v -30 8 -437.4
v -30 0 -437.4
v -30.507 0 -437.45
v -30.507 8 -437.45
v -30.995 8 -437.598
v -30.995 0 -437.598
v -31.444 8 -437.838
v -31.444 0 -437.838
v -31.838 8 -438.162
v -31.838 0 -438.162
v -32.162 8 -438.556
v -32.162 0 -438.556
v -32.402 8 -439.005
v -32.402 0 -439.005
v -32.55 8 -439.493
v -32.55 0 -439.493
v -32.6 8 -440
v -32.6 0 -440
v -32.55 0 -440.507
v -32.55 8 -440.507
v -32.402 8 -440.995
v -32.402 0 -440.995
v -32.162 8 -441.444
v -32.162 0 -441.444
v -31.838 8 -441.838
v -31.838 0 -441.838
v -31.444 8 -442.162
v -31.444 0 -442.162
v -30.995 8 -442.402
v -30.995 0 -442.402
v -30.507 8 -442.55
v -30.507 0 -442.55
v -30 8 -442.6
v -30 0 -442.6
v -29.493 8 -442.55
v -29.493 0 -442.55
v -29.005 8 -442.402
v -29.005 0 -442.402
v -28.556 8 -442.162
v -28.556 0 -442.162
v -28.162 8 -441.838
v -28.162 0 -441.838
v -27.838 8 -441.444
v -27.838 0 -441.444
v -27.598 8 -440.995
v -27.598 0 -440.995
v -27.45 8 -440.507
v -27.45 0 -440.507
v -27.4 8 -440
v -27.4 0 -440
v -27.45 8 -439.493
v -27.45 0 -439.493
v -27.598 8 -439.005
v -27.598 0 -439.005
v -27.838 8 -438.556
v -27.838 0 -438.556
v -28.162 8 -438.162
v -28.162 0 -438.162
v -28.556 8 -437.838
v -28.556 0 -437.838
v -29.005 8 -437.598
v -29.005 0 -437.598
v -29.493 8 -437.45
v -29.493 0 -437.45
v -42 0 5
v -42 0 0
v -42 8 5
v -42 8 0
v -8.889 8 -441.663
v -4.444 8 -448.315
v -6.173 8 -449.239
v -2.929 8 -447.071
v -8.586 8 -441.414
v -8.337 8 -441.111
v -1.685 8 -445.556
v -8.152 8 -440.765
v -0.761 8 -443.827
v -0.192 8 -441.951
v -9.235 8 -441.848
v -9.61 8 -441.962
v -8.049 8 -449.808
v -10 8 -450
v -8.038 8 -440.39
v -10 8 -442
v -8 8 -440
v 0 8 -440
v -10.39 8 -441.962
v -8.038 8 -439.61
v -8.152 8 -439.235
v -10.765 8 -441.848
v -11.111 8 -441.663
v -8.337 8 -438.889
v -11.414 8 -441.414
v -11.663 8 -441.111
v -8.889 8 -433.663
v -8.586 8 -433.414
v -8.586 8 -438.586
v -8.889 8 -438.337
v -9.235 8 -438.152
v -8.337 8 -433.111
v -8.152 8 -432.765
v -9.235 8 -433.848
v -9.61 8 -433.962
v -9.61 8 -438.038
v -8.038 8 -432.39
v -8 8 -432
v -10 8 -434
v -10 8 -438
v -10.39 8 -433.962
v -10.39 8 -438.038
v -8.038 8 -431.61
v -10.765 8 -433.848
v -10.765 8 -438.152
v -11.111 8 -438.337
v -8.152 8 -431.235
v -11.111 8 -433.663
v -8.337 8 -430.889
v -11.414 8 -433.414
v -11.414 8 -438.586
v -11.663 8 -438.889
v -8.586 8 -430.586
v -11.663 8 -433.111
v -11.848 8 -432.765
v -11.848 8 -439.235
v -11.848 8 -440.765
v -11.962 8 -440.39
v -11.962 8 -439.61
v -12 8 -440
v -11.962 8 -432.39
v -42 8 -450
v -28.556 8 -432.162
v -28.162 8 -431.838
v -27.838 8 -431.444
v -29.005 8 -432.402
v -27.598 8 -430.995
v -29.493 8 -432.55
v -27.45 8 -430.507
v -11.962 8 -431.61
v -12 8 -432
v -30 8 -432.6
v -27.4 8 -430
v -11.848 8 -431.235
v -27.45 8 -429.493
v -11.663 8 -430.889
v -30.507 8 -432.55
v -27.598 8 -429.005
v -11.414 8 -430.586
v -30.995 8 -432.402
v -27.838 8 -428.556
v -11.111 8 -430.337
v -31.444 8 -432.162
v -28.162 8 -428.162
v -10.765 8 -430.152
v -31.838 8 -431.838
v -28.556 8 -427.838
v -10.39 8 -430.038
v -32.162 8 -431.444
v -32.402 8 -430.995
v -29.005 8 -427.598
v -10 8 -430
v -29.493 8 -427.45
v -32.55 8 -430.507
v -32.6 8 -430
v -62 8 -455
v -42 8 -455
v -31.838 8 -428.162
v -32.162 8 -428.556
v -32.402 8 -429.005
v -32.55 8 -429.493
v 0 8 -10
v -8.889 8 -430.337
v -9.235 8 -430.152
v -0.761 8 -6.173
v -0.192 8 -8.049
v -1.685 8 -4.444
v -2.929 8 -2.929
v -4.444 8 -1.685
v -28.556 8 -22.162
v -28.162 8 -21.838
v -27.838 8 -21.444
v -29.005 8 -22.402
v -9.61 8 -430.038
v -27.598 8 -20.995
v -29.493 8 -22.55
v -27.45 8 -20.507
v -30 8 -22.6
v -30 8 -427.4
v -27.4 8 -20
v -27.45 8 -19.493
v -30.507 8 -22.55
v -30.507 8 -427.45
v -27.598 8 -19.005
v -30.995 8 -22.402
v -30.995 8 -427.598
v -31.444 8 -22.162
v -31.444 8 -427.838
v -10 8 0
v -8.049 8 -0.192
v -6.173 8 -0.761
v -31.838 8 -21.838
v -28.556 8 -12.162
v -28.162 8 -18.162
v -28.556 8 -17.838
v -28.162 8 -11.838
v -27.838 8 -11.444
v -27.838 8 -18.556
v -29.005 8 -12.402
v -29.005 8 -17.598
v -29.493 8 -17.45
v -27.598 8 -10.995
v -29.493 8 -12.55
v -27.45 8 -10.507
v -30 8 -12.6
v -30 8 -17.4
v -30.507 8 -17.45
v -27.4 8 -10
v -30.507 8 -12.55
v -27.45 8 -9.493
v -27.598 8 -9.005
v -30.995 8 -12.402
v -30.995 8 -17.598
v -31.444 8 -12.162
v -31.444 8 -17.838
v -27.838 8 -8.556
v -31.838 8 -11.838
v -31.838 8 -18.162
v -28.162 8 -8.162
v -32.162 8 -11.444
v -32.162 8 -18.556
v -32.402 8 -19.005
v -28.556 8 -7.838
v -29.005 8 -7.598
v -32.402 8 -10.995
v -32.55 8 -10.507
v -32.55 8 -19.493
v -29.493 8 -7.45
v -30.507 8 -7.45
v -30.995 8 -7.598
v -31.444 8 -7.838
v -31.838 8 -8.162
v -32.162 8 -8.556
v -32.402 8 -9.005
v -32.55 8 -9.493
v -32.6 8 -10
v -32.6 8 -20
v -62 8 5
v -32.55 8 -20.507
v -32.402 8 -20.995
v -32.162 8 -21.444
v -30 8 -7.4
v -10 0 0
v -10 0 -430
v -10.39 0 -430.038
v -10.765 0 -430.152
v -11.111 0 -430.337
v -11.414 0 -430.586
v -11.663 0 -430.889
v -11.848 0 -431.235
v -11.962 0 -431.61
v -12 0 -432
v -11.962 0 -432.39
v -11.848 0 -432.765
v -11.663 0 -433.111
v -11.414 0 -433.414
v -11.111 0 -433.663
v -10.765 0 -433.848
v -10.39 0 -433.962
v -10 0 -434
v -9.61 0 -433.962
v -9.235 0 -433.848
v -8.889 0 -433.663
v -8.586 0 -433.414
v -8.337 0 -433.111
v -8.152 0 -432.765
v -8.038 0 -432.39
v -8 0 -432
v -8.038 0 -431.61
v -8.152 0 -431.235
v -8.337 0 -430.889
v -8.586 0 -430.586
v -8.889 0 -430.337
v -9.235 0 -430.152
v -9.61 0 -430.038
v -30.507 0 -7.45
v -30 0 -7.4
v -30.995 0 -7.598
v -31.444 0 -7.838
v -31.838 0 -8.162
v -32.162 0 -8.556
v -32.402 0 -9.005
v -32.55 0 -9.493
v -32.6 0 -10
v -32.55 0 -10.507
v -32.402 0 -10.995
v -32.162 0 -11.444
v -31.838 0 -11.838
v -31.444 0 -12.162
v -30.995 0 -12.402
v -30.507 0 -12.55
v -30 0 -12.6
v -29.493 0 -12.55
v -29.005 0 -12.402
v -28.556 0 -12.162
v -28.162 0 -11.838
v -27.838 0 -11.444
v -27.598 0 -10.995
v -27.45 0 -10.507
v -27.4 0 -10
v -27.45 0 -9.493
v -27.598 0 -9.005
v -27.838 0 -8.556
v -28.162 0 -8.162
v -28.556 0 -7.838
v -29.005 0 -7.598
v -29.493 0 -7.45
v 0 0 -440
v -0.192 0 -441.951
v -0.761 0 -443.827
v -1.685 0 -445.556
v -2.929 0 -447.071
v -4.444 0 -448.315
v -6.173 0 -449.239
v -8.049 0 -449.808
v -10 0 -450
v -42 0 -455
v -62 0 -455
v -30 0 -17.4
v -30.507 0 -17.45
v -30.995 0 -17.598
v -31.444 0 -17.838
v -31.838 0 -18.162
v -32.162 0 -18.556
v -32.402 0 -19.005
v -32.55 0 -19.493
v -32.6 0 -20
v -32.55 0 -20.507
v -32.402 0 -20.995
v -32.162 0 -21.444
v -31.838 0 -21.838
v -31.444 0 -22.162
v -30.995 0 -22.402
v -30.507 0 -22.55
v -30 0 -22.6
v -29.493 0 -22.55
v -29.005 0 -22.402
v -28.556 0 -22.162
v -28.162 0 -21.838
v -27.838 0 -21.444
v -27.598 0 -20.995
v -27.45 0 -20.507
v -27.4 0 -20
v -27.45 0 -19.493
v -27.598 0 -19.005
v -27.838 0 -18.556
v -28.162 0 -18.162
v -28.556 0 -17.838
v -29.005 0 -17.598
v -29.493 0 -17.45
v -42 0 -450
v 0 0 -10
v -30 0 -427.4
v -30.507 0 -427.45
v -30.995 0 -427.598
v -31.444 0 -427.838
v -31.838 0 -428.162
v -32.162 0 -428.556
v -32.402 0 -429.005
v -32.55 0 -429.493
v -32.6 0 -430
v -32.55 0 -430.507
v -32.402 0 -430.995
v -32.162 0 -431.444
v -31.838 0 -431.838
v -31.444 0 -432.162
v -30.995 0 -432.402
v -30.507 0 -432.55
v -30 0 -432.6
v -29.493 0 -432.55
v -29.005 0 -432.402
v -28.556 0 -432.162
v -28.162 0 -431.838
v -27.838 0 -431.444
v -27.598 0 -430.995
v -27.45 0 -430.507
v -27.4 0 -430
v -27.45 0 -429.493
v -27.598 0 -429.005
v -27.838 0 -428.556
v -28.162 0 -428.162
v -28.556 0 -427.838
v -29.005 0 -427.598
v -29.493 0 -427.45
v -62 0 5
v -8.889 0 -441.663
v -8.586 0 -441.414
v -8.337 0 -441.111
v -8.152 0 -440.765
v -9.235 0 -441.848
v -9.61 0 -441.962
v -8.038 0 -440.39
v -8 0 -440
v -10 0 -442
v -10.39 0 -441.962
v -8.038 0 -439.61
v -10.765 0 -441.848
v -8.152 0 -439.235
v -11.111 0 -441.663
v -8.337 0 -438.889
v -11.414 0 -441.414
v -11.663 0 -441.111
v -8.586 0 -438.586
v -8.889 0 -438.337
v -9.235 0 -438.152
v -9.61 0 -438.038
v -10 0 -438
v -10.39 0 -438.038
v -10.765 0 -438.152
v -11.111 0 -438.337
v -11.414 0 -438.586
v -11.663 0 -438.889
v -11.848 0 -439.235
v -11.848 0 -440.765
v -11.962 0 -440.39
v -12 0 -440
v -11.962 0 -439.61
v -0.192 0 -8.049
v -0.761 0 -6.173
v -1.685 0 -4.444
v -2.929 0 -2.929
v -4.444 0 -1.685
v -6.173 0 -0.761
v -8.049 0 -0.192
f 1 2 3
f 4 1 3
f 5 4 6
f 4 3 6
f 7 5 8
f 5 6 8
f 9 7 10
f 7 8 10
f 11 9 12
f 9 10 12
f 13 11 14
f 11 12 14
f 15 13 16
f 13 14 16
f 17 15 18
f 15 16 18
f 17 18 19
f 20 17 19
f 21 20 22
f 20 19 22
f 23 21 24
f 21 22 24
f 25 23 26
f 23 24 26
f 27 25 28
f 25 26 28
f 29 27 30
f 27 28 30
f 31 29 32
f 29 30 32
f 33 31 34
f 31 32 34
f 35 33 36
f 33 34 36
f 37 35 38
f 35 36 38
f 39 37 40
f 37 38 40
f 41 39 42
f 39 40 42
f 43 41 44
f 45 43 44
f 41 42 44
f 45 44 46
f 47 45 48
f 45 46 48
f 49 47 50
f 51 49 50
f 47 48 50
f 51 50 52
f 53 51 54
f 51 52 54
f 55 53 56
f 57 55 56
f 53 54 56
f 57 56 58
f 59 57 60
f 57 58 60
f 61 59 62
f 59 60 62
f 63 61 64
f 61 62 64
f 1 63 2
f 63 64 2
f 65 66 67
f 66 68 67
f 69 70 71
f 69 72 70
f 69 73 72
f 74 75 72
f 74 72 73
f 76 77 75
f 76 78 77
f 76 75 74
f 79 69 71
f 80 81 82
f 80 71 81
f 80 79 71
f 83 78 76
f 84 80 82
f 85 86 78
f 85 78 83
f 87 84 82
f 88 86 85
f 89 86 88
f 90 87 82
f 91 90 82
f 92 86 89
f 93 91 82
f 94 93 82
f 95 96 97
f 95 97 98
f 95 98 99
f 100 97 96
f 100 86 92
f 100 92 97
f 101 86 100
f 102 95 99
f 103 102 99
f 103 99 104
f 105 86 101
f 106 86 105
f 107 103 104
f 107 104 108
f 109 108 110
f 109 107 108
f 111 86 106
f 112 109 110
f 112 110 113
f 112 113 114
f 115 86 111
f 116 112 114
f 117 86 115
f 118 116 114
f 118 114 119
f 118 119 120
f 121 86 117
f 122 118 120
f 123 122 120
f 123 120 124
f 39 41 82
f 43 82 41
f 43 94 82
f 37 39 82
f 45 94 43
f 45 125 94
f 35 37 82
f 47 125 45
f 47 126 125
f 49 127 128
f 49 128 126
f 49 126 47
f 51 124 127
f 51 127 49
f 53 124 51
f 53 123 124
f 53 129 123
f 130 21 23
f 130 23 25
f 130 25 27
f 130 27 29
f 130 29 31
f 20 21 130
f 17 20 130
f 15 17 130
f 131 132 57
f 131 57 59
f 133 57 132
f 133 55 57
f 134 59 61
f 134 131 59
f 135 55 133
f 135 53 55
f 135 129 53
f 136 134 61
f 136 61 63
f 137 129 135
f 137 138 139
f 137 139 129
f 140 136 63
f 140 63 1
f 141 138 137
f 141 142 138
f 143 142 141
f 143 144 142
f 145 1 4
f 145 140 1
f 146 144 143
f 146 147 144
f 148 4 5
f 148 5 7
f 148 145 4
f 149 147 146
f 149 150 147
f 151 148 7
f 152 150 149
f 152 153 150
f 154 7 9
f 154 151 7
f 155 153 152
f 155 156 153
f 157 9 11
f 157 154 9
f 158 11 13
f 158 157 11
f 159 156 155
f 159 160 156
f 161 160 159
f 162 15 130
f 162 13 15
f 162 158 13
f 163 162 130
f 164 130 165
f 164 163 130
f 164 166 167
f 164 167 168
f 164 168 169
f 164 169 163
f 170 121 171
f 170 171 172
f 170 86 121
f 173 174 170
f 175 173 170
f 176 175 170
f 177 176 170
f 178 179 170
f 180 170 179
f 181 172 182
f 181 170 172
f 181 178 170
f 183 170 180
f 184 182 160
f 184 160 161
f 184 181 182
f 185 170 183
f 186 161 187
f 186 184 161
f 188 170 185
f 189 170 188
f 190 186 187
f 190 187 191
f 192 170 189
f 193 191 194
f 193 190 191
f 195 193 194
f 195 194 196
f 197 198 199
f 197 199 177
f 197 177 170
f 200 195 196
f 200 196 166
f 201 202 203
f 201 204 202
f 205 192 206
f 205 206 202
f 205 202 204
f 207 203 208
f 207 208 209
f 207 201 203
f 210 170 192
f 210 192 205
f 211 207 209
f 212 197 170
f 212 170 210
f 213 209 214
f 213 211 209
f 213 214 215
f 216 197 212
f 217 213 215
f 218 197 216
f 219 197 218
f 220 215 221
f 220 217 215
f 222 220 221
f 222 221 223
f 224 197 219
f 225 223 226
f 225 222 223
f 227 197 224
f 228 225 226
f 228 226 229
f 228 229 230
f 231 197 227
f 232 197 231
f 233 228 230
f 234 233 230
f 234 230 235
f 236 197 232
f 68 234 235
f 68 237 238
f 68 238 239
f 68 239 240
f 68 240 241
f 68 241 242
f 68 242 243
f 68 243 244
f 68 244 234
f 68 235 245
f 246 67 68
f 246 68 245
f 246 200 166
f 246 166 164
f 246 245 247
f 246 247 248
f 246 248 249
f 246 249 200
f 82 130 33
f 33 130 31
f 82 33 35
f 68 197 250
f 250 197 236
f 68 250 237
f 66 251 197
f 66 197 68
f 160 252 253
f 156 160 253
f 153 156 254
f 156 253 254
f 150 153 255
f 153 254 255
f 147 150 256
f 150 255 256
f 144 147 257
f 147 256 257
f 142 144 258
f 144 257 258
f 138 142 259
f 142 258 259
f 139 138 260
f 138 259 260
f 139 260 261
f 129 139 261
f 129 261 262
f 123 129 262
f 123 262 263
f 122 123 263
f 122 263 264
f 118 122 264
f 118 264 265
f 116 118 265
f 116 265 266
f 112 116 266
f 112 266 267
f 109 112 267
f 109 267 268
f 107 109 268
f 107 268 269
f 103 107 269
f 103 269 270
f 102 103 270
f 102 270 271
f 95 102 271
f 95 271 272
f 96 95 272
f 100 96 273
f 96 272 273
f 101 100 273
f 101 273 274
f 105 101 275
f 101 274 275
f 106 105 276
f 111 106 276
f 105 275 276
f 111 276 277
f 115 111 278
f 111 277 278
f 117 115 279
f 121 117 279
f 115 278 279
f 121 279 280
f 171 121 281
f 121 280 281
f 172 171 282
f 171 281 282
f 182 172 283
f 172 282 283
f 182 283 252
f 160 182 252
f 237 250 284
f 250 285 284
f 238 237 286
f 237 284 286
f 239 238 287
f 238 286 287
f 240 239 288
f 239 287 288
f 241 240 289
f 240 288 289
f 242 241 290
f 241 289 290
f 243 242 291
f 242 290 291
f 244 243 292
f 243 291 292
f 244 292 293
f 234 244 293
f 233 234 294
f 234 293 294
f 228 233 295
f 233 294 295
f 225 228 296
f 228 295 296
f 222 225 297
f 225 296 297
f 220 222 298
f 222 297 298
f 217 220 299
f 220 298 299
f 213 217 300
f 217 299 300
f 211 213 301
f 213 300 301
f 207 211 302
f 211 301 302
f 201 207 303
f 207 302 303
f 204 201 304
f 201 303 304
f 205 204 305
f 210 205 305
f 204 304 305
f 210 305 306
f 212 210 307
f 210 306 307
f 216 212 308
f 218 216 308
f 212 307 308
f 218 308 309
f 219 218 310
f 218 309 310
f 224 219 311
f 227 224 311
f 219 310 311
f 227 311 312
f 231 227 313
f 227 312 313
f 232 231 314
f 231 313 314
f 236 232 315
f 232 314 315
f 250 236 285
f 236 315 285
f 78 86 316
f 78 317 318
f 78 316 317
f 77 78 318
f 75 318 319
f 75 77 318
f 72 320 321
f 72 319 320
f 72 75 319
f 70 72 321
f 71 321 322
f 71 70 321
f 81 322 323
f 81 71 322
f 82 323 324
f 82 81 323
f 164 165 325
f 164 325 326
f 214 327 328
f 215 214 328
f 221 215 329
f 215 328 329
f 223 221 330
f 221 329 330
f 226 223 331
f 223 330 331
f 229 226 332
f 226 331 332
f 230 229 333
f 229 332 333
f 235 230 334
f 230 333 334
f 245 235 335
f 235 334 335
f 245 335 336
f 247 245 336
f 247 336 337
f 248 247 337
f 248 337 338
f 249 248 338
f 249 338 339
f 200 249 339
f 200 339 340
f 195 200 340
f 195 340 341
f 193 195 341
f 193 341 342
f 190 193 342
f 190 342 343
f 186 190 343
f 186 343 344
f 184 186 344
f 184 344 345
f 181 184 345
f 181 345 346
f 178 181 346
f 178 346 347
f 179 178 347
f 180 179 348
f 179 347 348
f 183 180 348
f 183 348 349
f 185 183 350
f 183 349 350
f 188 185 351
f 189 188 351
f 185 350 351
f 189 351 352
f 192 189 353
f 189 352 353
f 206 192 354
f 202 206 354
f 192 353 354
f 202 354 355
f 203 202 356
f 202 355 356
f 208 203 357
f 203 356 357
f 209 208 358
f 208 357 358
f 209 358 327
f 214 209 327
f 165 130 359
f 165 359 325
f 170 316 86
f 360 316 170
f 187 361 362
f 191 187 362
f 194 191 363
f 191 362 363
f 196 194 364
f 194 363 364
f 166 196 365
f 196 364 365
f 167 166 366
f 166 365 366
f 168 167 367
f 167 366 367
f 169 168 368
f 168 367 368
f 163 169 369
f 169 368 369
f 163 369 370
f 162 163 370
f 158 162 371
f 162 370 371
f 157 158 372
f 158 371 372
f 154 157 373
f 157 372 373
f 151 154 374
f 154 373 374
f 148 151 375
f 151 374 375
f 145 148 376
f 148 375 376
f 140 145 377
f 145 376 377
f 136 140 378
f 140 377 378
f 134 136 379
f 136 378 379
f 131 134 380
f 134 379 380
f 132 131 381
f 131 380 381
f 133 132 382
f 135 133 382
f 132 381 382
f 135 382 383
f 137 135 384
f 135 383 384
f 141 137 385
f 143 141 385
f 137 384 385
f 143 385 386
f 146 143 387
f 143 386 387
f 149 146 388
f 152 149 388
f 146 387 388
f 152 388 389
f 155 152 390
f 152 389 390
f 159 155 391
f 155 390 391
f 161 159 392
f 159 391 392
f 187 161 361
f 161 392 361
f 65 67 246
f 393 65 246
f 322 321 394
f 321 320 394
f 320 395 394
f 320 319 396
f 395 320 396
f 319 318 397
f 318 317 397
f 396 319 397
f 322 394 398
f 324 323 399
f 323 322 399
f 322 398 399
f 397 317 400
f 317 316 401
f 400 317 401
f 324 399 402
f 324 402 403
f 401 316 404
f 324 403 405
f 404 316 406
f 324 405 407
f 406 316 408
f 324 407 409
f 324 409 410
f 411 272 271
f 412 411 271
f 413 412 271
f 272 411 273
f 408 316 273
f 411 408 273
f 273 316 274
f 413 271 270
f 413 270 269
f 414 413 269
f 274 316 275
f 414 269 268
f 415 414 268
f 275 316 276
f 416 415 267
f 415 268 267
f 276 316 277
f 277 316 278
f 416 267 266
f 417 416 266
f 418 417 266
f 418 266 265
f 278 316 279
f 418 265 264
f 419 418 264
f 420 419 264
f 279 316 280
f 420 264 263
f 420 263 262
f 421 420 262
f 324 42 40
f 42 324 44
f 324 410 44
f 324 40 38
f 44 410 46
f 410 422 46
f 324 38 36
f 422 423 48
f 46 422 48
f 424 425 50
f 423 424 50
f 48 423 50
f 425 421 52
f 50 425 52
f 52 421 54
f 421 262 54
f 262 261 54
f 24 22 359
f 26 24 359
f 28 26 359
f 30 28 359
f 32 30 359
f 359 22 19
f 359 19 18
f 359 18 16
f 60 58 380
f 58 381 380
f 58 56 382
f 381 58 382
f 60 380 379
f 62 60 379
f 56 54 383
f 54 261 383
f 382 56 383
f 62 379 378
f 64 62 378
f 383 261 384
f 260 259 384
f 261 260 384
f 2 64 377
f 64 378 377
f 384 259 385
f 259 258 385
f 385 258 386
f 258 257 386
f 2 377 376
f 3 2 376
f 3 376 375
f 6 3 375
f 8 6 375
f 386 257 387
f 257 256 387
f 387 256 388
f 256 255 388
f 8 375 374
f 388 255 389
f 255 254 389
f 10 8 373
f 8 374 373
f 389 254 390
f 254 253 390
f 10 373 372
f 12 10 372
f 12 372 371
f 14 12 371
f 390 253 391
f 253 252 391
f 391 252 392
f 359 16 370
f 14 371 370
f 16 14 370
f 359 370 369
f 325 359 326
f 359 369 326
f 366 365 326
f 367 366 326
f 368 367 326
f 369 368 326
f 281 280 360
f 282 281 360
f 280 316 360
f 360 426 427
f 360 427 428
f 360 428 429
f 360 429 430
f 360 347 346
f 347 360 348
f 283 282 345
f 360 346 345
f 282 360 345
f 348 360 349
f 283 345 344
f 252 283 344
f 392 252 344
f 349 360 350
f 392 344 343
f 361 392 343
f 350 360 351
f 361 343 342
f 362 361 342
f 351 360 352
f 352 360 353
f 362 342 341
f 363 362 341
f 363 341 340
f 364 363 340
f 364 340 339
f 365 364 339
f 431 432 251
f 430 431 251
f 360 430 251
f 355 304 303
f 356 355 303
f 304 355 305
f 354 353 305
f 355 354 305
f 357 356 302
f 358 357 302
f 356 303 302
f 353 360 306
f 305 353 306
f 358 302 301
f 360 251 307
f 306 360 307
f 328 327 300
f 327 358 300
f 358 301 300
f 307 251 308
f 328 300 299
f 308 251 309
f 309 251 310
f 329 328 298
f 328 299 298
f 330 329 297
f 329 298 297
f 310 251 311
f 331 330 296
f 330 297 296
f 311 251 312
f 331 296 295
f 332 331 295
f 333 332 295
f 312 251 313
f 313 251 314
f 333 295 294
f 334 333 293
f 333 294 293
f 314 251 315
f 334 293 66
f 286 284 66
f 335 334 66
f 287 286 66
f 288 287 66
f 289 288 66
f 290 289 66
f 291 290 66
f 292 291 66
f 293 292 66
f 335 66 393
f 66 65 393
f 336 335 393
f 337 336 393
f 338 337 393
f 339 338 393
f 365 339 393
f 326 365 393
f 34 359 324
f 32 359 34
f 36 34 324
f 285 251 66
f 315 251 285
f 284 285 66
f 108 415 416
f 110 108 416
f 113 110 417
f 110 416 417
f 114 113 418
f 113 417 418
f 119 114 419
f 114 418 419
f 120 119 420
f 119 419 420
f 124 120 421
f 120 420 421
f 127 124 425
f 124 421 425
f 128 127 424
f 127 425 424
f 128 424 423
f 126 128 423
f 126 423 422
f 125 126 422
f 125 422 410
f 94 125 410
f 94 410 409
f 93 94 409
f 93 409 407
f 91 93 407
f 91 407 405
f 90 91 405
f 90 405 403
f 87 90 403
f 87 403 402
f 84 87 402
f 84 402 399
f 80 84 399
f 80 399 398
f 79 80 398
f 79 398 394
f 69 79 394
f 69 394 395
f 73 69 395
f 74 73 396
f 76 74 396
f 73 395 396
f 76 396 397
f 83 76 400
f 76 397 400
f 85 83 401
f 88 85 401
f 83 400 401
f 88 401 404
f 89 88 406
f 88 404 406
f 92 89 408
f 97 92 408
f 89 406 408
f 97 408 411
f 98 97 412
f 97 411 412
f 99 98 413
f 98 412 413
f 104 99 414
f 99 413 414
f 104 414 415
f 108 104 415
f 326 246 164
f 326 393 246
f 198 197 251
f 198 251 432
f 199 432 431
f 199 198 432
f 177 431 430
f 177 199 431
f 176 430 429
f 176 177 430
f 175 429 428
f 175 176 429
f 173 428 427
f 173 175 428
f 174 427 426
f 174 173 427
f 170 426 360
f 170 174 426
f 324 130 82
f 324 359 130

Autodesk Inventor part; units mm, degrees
ref_plane "YZ Plane" through (0, 0, 0) normal (1, 0, 0) x (0, 1, 0)
ref_plane "XZ Plane" through (0, 0, 0) normal (0, 1, 0) x (-1, 0, 0)
ref_plane "XY Plane" through (0, 0, 0) normal (0, 0, 1) x (1, 0, 0)
sketch "Sketch1" plane through (0, 0, 0) normal (0, 1, 0) x (-1, 0, 0)
  line L0 (0, 0) -> (62, 0)
  line L1 (62, 0) -> (62, -450)
  line L2 (62, -450) -> (0, -450)
  line L3 (0, -450) -> (0, 0)
  dimension "d0" = 62
  dimension "d1" = 450
extrude "Extrusion1" add sketch "Sketch1" along normal blind 8
fillet "Fillet1" radius 10 2 edges at (0, 4, 0) (0, 4, -450)
sketch "Sketch3" plane through (0, 8, 0) normal (0, 1, 0) x (1, 0, 0)
  point P0 (0, 0)
sketch "Sketch4" plane through (0, 8, 0) normal (0, 1, 0) x (1, 0, 0)
  circle A0 centre (-10, 440) radius 2
  circle A1 centre (-10, 432) radius 2
  line L0 (0, 10) -> (0, 440) projected
  line L1 (-10, 450) -> (-62, 450) projected
  point P0 (0, 0)
  dimension "d25" = 10
  dimension "d26" = 10
  dimension "d27" = 4
  dimension "d28" = 4
  dimension "d29" = 10
  dimension "d30" = 8
hole "Hole2" at (-10, 8, -432) at (-10, 8, -440) direction (0, -1, 0) diameter 4 end through all
sketch "Sketch5" plane through (0, 8, 0) normal (0, 1, 0) x (1, 0, 0)
  point P0 (0, 0)
sketch "Sketch6" plane through (0, 8, 0) normal (0, 1, 0) x (1, 0, 0)
  circle A0 centre (-30, 20) radius 2.6
  circle A1 centre (-30, 10) radius 2.6
  line L0 (-62, 0) -> (-10, 0) projected
  line L1 (-62, 450) -> (-62, 0) projected
  line L2 (-101.8296, 225) -> (129.7674, 225) construction
  circle A2 centre (-30, 430) radius 2.6
  circle A3 centre (-30, 440) radius 2.6
  point P0 (0, 0)
  point P1 (-10, 450)
  dimension "d38" = 5.2
  dimension "d39" = 5.2
  dimension "d40" = 20
  dimension "d41" = 10
  dimension "d42" = 32
  dimension "d43" = 32
  dimension "d44" = 225
hole "Hole3" at (-30, 8, -20) at (-30, 8, -10) at (-30, 8, -440) at (-30, 8, -430) direction (0, -1, 0) diameter 5.2 end through all
sketch "Sketch7" plane through (0, 8, 0) normal (0, 1, 0) x (1, 0, 0)
  line L0 (-62, 450) -> (-62, 0) projected
  line L1 (-62, 0) -> (-42, 0)
  line L2 (-42, 0) -> (-42, -5)
  line L3 (-42, -5) -> (-62, -5)
  line L4 (-62, -5) -> (-62, 0)
  line L5 (-62, 450) -> (-42, 450)
  line L6 (-42, 450) -> (-42, 455)
  line L7 (-42, 455) -> (-62, 455)
  line L8 (-62, 455) -> (-62, 450)
  point P0 (0, 0)
  dimension "d52" = 20
  dimension "d53" = 5
  dimension "d54" = 20
  dimension "d55" = 5
extrude "Extrusion2" add sketch "Sketch7" against normal blind 8
equation "\"d31\" = d28"
properties part number "X_Kettenhalter"
